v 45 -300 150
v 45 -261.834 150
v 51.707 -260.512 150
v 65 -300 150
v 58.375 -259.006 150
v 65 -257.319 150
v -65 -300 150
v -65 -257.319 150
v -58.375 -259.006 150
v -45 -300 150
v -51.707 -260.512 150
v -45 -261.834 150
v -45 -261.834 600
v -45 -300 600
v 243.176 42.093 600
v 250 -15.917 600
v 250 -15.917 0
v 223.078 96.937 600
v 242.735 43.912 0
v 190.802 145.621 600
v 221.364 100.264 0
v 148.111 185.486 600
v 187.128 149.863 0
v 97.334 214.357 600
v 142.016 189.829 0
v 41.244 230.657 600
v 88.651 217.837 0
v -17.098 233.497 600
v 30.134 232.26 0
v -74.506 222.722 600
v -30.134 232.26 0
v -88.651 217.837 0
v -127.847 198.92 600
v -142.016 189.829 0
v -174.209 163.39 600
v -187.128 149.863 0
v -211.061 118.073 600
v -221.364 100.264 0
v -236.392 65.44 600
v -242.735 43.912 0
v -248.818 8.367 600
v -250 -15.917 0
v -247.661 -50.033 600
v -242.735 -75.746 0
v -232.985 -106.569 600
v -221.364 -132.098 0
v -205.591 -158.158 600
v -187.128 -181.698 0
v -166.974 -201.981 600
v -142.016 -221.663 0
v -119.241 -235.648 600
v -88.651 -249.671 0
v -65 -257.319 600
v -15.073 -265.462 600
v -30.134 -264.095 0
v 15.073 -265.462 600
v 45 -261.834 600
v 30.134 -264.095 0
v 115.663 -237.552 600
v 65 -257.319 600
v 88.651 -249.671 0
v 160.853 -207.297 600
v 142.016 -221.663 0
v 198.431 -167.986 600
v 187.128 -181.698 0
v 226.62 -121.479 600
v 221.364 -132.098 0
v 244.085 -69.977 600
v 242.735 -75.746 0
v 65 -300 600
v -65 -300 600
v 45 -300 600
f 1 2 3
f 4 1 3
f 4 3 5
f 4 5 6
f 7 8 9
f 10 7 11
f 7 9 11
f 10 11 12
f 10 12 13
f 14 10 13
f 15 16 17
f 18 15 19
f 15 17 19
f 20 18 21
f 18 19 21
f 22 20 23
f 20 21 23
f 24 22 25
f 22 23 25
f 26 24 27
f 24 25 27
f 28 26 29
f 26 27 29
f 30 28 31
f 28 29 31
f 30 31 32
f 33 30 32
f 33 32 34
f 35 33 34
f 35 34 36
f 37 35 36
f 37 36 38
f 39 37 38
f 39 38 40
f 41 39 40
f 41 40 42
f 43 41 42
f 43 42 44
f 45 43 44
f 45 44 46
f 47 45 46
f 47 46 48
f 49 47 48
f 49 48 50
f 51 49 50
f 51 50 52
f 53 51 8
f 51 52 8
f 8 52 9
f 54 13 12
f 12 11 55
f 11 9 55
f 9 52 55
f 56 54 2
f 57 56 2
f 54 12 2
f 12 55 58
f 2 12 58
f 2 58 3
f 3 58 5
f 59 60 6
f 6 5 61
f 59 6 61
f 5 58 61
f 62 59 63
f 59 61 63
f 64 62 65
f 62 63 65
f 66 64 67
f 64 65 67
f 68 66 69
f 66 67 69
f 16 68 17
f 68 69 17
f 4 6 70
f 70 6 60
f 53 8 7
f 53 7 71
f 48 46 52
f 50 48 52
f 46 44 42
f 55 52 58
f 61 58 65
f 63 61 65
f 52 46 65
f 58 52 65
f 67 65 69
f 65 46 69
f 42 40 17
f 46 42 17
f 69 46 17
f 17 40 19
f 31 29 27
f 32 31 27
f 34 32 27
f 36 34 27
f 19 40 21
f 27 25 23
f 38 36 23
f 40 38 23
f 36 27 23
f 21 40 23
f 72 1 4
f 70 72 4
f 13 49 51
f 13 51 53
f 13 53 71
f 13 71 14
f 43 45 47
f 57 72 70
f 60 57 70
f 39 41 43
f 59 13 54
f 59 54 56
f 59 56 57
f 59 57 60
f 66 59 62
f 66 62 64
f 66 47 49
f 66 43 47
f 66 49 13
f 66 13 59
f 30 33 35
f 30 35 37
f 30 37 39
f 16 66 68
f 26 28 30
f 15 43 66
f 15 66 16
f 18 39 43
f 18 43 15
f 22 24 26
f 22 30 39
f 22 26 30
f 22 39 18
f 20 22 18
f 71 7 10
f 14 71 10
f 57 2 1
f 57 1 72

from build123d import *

# Parameters (mm, degrees)
F0_R     = 250
F1_DEPTH = 600
F2_W     = 20
F2_H     = 450
F3_DEPTH = 300


with BuildPart() as f1:
    # F0 (on Top) → F1 (new body)
    with BuildSketch(Plane.XY):
        with Locations((0, -15.917291)):
            Circle(F0_R)
    extrude(amount=F1_DEPTH)

    # F2 (on Front) → F3 (join)
    with BuildSketch(Plane.XZ):
        with Locations((55, 375)):
            Rectangle(F2_W, F2_H)
        with Locations((-55, 375)):
            Rectangle(F2_W, F2_H)
    extrude(amount=F3_DEPTH)


solid = f1.part
